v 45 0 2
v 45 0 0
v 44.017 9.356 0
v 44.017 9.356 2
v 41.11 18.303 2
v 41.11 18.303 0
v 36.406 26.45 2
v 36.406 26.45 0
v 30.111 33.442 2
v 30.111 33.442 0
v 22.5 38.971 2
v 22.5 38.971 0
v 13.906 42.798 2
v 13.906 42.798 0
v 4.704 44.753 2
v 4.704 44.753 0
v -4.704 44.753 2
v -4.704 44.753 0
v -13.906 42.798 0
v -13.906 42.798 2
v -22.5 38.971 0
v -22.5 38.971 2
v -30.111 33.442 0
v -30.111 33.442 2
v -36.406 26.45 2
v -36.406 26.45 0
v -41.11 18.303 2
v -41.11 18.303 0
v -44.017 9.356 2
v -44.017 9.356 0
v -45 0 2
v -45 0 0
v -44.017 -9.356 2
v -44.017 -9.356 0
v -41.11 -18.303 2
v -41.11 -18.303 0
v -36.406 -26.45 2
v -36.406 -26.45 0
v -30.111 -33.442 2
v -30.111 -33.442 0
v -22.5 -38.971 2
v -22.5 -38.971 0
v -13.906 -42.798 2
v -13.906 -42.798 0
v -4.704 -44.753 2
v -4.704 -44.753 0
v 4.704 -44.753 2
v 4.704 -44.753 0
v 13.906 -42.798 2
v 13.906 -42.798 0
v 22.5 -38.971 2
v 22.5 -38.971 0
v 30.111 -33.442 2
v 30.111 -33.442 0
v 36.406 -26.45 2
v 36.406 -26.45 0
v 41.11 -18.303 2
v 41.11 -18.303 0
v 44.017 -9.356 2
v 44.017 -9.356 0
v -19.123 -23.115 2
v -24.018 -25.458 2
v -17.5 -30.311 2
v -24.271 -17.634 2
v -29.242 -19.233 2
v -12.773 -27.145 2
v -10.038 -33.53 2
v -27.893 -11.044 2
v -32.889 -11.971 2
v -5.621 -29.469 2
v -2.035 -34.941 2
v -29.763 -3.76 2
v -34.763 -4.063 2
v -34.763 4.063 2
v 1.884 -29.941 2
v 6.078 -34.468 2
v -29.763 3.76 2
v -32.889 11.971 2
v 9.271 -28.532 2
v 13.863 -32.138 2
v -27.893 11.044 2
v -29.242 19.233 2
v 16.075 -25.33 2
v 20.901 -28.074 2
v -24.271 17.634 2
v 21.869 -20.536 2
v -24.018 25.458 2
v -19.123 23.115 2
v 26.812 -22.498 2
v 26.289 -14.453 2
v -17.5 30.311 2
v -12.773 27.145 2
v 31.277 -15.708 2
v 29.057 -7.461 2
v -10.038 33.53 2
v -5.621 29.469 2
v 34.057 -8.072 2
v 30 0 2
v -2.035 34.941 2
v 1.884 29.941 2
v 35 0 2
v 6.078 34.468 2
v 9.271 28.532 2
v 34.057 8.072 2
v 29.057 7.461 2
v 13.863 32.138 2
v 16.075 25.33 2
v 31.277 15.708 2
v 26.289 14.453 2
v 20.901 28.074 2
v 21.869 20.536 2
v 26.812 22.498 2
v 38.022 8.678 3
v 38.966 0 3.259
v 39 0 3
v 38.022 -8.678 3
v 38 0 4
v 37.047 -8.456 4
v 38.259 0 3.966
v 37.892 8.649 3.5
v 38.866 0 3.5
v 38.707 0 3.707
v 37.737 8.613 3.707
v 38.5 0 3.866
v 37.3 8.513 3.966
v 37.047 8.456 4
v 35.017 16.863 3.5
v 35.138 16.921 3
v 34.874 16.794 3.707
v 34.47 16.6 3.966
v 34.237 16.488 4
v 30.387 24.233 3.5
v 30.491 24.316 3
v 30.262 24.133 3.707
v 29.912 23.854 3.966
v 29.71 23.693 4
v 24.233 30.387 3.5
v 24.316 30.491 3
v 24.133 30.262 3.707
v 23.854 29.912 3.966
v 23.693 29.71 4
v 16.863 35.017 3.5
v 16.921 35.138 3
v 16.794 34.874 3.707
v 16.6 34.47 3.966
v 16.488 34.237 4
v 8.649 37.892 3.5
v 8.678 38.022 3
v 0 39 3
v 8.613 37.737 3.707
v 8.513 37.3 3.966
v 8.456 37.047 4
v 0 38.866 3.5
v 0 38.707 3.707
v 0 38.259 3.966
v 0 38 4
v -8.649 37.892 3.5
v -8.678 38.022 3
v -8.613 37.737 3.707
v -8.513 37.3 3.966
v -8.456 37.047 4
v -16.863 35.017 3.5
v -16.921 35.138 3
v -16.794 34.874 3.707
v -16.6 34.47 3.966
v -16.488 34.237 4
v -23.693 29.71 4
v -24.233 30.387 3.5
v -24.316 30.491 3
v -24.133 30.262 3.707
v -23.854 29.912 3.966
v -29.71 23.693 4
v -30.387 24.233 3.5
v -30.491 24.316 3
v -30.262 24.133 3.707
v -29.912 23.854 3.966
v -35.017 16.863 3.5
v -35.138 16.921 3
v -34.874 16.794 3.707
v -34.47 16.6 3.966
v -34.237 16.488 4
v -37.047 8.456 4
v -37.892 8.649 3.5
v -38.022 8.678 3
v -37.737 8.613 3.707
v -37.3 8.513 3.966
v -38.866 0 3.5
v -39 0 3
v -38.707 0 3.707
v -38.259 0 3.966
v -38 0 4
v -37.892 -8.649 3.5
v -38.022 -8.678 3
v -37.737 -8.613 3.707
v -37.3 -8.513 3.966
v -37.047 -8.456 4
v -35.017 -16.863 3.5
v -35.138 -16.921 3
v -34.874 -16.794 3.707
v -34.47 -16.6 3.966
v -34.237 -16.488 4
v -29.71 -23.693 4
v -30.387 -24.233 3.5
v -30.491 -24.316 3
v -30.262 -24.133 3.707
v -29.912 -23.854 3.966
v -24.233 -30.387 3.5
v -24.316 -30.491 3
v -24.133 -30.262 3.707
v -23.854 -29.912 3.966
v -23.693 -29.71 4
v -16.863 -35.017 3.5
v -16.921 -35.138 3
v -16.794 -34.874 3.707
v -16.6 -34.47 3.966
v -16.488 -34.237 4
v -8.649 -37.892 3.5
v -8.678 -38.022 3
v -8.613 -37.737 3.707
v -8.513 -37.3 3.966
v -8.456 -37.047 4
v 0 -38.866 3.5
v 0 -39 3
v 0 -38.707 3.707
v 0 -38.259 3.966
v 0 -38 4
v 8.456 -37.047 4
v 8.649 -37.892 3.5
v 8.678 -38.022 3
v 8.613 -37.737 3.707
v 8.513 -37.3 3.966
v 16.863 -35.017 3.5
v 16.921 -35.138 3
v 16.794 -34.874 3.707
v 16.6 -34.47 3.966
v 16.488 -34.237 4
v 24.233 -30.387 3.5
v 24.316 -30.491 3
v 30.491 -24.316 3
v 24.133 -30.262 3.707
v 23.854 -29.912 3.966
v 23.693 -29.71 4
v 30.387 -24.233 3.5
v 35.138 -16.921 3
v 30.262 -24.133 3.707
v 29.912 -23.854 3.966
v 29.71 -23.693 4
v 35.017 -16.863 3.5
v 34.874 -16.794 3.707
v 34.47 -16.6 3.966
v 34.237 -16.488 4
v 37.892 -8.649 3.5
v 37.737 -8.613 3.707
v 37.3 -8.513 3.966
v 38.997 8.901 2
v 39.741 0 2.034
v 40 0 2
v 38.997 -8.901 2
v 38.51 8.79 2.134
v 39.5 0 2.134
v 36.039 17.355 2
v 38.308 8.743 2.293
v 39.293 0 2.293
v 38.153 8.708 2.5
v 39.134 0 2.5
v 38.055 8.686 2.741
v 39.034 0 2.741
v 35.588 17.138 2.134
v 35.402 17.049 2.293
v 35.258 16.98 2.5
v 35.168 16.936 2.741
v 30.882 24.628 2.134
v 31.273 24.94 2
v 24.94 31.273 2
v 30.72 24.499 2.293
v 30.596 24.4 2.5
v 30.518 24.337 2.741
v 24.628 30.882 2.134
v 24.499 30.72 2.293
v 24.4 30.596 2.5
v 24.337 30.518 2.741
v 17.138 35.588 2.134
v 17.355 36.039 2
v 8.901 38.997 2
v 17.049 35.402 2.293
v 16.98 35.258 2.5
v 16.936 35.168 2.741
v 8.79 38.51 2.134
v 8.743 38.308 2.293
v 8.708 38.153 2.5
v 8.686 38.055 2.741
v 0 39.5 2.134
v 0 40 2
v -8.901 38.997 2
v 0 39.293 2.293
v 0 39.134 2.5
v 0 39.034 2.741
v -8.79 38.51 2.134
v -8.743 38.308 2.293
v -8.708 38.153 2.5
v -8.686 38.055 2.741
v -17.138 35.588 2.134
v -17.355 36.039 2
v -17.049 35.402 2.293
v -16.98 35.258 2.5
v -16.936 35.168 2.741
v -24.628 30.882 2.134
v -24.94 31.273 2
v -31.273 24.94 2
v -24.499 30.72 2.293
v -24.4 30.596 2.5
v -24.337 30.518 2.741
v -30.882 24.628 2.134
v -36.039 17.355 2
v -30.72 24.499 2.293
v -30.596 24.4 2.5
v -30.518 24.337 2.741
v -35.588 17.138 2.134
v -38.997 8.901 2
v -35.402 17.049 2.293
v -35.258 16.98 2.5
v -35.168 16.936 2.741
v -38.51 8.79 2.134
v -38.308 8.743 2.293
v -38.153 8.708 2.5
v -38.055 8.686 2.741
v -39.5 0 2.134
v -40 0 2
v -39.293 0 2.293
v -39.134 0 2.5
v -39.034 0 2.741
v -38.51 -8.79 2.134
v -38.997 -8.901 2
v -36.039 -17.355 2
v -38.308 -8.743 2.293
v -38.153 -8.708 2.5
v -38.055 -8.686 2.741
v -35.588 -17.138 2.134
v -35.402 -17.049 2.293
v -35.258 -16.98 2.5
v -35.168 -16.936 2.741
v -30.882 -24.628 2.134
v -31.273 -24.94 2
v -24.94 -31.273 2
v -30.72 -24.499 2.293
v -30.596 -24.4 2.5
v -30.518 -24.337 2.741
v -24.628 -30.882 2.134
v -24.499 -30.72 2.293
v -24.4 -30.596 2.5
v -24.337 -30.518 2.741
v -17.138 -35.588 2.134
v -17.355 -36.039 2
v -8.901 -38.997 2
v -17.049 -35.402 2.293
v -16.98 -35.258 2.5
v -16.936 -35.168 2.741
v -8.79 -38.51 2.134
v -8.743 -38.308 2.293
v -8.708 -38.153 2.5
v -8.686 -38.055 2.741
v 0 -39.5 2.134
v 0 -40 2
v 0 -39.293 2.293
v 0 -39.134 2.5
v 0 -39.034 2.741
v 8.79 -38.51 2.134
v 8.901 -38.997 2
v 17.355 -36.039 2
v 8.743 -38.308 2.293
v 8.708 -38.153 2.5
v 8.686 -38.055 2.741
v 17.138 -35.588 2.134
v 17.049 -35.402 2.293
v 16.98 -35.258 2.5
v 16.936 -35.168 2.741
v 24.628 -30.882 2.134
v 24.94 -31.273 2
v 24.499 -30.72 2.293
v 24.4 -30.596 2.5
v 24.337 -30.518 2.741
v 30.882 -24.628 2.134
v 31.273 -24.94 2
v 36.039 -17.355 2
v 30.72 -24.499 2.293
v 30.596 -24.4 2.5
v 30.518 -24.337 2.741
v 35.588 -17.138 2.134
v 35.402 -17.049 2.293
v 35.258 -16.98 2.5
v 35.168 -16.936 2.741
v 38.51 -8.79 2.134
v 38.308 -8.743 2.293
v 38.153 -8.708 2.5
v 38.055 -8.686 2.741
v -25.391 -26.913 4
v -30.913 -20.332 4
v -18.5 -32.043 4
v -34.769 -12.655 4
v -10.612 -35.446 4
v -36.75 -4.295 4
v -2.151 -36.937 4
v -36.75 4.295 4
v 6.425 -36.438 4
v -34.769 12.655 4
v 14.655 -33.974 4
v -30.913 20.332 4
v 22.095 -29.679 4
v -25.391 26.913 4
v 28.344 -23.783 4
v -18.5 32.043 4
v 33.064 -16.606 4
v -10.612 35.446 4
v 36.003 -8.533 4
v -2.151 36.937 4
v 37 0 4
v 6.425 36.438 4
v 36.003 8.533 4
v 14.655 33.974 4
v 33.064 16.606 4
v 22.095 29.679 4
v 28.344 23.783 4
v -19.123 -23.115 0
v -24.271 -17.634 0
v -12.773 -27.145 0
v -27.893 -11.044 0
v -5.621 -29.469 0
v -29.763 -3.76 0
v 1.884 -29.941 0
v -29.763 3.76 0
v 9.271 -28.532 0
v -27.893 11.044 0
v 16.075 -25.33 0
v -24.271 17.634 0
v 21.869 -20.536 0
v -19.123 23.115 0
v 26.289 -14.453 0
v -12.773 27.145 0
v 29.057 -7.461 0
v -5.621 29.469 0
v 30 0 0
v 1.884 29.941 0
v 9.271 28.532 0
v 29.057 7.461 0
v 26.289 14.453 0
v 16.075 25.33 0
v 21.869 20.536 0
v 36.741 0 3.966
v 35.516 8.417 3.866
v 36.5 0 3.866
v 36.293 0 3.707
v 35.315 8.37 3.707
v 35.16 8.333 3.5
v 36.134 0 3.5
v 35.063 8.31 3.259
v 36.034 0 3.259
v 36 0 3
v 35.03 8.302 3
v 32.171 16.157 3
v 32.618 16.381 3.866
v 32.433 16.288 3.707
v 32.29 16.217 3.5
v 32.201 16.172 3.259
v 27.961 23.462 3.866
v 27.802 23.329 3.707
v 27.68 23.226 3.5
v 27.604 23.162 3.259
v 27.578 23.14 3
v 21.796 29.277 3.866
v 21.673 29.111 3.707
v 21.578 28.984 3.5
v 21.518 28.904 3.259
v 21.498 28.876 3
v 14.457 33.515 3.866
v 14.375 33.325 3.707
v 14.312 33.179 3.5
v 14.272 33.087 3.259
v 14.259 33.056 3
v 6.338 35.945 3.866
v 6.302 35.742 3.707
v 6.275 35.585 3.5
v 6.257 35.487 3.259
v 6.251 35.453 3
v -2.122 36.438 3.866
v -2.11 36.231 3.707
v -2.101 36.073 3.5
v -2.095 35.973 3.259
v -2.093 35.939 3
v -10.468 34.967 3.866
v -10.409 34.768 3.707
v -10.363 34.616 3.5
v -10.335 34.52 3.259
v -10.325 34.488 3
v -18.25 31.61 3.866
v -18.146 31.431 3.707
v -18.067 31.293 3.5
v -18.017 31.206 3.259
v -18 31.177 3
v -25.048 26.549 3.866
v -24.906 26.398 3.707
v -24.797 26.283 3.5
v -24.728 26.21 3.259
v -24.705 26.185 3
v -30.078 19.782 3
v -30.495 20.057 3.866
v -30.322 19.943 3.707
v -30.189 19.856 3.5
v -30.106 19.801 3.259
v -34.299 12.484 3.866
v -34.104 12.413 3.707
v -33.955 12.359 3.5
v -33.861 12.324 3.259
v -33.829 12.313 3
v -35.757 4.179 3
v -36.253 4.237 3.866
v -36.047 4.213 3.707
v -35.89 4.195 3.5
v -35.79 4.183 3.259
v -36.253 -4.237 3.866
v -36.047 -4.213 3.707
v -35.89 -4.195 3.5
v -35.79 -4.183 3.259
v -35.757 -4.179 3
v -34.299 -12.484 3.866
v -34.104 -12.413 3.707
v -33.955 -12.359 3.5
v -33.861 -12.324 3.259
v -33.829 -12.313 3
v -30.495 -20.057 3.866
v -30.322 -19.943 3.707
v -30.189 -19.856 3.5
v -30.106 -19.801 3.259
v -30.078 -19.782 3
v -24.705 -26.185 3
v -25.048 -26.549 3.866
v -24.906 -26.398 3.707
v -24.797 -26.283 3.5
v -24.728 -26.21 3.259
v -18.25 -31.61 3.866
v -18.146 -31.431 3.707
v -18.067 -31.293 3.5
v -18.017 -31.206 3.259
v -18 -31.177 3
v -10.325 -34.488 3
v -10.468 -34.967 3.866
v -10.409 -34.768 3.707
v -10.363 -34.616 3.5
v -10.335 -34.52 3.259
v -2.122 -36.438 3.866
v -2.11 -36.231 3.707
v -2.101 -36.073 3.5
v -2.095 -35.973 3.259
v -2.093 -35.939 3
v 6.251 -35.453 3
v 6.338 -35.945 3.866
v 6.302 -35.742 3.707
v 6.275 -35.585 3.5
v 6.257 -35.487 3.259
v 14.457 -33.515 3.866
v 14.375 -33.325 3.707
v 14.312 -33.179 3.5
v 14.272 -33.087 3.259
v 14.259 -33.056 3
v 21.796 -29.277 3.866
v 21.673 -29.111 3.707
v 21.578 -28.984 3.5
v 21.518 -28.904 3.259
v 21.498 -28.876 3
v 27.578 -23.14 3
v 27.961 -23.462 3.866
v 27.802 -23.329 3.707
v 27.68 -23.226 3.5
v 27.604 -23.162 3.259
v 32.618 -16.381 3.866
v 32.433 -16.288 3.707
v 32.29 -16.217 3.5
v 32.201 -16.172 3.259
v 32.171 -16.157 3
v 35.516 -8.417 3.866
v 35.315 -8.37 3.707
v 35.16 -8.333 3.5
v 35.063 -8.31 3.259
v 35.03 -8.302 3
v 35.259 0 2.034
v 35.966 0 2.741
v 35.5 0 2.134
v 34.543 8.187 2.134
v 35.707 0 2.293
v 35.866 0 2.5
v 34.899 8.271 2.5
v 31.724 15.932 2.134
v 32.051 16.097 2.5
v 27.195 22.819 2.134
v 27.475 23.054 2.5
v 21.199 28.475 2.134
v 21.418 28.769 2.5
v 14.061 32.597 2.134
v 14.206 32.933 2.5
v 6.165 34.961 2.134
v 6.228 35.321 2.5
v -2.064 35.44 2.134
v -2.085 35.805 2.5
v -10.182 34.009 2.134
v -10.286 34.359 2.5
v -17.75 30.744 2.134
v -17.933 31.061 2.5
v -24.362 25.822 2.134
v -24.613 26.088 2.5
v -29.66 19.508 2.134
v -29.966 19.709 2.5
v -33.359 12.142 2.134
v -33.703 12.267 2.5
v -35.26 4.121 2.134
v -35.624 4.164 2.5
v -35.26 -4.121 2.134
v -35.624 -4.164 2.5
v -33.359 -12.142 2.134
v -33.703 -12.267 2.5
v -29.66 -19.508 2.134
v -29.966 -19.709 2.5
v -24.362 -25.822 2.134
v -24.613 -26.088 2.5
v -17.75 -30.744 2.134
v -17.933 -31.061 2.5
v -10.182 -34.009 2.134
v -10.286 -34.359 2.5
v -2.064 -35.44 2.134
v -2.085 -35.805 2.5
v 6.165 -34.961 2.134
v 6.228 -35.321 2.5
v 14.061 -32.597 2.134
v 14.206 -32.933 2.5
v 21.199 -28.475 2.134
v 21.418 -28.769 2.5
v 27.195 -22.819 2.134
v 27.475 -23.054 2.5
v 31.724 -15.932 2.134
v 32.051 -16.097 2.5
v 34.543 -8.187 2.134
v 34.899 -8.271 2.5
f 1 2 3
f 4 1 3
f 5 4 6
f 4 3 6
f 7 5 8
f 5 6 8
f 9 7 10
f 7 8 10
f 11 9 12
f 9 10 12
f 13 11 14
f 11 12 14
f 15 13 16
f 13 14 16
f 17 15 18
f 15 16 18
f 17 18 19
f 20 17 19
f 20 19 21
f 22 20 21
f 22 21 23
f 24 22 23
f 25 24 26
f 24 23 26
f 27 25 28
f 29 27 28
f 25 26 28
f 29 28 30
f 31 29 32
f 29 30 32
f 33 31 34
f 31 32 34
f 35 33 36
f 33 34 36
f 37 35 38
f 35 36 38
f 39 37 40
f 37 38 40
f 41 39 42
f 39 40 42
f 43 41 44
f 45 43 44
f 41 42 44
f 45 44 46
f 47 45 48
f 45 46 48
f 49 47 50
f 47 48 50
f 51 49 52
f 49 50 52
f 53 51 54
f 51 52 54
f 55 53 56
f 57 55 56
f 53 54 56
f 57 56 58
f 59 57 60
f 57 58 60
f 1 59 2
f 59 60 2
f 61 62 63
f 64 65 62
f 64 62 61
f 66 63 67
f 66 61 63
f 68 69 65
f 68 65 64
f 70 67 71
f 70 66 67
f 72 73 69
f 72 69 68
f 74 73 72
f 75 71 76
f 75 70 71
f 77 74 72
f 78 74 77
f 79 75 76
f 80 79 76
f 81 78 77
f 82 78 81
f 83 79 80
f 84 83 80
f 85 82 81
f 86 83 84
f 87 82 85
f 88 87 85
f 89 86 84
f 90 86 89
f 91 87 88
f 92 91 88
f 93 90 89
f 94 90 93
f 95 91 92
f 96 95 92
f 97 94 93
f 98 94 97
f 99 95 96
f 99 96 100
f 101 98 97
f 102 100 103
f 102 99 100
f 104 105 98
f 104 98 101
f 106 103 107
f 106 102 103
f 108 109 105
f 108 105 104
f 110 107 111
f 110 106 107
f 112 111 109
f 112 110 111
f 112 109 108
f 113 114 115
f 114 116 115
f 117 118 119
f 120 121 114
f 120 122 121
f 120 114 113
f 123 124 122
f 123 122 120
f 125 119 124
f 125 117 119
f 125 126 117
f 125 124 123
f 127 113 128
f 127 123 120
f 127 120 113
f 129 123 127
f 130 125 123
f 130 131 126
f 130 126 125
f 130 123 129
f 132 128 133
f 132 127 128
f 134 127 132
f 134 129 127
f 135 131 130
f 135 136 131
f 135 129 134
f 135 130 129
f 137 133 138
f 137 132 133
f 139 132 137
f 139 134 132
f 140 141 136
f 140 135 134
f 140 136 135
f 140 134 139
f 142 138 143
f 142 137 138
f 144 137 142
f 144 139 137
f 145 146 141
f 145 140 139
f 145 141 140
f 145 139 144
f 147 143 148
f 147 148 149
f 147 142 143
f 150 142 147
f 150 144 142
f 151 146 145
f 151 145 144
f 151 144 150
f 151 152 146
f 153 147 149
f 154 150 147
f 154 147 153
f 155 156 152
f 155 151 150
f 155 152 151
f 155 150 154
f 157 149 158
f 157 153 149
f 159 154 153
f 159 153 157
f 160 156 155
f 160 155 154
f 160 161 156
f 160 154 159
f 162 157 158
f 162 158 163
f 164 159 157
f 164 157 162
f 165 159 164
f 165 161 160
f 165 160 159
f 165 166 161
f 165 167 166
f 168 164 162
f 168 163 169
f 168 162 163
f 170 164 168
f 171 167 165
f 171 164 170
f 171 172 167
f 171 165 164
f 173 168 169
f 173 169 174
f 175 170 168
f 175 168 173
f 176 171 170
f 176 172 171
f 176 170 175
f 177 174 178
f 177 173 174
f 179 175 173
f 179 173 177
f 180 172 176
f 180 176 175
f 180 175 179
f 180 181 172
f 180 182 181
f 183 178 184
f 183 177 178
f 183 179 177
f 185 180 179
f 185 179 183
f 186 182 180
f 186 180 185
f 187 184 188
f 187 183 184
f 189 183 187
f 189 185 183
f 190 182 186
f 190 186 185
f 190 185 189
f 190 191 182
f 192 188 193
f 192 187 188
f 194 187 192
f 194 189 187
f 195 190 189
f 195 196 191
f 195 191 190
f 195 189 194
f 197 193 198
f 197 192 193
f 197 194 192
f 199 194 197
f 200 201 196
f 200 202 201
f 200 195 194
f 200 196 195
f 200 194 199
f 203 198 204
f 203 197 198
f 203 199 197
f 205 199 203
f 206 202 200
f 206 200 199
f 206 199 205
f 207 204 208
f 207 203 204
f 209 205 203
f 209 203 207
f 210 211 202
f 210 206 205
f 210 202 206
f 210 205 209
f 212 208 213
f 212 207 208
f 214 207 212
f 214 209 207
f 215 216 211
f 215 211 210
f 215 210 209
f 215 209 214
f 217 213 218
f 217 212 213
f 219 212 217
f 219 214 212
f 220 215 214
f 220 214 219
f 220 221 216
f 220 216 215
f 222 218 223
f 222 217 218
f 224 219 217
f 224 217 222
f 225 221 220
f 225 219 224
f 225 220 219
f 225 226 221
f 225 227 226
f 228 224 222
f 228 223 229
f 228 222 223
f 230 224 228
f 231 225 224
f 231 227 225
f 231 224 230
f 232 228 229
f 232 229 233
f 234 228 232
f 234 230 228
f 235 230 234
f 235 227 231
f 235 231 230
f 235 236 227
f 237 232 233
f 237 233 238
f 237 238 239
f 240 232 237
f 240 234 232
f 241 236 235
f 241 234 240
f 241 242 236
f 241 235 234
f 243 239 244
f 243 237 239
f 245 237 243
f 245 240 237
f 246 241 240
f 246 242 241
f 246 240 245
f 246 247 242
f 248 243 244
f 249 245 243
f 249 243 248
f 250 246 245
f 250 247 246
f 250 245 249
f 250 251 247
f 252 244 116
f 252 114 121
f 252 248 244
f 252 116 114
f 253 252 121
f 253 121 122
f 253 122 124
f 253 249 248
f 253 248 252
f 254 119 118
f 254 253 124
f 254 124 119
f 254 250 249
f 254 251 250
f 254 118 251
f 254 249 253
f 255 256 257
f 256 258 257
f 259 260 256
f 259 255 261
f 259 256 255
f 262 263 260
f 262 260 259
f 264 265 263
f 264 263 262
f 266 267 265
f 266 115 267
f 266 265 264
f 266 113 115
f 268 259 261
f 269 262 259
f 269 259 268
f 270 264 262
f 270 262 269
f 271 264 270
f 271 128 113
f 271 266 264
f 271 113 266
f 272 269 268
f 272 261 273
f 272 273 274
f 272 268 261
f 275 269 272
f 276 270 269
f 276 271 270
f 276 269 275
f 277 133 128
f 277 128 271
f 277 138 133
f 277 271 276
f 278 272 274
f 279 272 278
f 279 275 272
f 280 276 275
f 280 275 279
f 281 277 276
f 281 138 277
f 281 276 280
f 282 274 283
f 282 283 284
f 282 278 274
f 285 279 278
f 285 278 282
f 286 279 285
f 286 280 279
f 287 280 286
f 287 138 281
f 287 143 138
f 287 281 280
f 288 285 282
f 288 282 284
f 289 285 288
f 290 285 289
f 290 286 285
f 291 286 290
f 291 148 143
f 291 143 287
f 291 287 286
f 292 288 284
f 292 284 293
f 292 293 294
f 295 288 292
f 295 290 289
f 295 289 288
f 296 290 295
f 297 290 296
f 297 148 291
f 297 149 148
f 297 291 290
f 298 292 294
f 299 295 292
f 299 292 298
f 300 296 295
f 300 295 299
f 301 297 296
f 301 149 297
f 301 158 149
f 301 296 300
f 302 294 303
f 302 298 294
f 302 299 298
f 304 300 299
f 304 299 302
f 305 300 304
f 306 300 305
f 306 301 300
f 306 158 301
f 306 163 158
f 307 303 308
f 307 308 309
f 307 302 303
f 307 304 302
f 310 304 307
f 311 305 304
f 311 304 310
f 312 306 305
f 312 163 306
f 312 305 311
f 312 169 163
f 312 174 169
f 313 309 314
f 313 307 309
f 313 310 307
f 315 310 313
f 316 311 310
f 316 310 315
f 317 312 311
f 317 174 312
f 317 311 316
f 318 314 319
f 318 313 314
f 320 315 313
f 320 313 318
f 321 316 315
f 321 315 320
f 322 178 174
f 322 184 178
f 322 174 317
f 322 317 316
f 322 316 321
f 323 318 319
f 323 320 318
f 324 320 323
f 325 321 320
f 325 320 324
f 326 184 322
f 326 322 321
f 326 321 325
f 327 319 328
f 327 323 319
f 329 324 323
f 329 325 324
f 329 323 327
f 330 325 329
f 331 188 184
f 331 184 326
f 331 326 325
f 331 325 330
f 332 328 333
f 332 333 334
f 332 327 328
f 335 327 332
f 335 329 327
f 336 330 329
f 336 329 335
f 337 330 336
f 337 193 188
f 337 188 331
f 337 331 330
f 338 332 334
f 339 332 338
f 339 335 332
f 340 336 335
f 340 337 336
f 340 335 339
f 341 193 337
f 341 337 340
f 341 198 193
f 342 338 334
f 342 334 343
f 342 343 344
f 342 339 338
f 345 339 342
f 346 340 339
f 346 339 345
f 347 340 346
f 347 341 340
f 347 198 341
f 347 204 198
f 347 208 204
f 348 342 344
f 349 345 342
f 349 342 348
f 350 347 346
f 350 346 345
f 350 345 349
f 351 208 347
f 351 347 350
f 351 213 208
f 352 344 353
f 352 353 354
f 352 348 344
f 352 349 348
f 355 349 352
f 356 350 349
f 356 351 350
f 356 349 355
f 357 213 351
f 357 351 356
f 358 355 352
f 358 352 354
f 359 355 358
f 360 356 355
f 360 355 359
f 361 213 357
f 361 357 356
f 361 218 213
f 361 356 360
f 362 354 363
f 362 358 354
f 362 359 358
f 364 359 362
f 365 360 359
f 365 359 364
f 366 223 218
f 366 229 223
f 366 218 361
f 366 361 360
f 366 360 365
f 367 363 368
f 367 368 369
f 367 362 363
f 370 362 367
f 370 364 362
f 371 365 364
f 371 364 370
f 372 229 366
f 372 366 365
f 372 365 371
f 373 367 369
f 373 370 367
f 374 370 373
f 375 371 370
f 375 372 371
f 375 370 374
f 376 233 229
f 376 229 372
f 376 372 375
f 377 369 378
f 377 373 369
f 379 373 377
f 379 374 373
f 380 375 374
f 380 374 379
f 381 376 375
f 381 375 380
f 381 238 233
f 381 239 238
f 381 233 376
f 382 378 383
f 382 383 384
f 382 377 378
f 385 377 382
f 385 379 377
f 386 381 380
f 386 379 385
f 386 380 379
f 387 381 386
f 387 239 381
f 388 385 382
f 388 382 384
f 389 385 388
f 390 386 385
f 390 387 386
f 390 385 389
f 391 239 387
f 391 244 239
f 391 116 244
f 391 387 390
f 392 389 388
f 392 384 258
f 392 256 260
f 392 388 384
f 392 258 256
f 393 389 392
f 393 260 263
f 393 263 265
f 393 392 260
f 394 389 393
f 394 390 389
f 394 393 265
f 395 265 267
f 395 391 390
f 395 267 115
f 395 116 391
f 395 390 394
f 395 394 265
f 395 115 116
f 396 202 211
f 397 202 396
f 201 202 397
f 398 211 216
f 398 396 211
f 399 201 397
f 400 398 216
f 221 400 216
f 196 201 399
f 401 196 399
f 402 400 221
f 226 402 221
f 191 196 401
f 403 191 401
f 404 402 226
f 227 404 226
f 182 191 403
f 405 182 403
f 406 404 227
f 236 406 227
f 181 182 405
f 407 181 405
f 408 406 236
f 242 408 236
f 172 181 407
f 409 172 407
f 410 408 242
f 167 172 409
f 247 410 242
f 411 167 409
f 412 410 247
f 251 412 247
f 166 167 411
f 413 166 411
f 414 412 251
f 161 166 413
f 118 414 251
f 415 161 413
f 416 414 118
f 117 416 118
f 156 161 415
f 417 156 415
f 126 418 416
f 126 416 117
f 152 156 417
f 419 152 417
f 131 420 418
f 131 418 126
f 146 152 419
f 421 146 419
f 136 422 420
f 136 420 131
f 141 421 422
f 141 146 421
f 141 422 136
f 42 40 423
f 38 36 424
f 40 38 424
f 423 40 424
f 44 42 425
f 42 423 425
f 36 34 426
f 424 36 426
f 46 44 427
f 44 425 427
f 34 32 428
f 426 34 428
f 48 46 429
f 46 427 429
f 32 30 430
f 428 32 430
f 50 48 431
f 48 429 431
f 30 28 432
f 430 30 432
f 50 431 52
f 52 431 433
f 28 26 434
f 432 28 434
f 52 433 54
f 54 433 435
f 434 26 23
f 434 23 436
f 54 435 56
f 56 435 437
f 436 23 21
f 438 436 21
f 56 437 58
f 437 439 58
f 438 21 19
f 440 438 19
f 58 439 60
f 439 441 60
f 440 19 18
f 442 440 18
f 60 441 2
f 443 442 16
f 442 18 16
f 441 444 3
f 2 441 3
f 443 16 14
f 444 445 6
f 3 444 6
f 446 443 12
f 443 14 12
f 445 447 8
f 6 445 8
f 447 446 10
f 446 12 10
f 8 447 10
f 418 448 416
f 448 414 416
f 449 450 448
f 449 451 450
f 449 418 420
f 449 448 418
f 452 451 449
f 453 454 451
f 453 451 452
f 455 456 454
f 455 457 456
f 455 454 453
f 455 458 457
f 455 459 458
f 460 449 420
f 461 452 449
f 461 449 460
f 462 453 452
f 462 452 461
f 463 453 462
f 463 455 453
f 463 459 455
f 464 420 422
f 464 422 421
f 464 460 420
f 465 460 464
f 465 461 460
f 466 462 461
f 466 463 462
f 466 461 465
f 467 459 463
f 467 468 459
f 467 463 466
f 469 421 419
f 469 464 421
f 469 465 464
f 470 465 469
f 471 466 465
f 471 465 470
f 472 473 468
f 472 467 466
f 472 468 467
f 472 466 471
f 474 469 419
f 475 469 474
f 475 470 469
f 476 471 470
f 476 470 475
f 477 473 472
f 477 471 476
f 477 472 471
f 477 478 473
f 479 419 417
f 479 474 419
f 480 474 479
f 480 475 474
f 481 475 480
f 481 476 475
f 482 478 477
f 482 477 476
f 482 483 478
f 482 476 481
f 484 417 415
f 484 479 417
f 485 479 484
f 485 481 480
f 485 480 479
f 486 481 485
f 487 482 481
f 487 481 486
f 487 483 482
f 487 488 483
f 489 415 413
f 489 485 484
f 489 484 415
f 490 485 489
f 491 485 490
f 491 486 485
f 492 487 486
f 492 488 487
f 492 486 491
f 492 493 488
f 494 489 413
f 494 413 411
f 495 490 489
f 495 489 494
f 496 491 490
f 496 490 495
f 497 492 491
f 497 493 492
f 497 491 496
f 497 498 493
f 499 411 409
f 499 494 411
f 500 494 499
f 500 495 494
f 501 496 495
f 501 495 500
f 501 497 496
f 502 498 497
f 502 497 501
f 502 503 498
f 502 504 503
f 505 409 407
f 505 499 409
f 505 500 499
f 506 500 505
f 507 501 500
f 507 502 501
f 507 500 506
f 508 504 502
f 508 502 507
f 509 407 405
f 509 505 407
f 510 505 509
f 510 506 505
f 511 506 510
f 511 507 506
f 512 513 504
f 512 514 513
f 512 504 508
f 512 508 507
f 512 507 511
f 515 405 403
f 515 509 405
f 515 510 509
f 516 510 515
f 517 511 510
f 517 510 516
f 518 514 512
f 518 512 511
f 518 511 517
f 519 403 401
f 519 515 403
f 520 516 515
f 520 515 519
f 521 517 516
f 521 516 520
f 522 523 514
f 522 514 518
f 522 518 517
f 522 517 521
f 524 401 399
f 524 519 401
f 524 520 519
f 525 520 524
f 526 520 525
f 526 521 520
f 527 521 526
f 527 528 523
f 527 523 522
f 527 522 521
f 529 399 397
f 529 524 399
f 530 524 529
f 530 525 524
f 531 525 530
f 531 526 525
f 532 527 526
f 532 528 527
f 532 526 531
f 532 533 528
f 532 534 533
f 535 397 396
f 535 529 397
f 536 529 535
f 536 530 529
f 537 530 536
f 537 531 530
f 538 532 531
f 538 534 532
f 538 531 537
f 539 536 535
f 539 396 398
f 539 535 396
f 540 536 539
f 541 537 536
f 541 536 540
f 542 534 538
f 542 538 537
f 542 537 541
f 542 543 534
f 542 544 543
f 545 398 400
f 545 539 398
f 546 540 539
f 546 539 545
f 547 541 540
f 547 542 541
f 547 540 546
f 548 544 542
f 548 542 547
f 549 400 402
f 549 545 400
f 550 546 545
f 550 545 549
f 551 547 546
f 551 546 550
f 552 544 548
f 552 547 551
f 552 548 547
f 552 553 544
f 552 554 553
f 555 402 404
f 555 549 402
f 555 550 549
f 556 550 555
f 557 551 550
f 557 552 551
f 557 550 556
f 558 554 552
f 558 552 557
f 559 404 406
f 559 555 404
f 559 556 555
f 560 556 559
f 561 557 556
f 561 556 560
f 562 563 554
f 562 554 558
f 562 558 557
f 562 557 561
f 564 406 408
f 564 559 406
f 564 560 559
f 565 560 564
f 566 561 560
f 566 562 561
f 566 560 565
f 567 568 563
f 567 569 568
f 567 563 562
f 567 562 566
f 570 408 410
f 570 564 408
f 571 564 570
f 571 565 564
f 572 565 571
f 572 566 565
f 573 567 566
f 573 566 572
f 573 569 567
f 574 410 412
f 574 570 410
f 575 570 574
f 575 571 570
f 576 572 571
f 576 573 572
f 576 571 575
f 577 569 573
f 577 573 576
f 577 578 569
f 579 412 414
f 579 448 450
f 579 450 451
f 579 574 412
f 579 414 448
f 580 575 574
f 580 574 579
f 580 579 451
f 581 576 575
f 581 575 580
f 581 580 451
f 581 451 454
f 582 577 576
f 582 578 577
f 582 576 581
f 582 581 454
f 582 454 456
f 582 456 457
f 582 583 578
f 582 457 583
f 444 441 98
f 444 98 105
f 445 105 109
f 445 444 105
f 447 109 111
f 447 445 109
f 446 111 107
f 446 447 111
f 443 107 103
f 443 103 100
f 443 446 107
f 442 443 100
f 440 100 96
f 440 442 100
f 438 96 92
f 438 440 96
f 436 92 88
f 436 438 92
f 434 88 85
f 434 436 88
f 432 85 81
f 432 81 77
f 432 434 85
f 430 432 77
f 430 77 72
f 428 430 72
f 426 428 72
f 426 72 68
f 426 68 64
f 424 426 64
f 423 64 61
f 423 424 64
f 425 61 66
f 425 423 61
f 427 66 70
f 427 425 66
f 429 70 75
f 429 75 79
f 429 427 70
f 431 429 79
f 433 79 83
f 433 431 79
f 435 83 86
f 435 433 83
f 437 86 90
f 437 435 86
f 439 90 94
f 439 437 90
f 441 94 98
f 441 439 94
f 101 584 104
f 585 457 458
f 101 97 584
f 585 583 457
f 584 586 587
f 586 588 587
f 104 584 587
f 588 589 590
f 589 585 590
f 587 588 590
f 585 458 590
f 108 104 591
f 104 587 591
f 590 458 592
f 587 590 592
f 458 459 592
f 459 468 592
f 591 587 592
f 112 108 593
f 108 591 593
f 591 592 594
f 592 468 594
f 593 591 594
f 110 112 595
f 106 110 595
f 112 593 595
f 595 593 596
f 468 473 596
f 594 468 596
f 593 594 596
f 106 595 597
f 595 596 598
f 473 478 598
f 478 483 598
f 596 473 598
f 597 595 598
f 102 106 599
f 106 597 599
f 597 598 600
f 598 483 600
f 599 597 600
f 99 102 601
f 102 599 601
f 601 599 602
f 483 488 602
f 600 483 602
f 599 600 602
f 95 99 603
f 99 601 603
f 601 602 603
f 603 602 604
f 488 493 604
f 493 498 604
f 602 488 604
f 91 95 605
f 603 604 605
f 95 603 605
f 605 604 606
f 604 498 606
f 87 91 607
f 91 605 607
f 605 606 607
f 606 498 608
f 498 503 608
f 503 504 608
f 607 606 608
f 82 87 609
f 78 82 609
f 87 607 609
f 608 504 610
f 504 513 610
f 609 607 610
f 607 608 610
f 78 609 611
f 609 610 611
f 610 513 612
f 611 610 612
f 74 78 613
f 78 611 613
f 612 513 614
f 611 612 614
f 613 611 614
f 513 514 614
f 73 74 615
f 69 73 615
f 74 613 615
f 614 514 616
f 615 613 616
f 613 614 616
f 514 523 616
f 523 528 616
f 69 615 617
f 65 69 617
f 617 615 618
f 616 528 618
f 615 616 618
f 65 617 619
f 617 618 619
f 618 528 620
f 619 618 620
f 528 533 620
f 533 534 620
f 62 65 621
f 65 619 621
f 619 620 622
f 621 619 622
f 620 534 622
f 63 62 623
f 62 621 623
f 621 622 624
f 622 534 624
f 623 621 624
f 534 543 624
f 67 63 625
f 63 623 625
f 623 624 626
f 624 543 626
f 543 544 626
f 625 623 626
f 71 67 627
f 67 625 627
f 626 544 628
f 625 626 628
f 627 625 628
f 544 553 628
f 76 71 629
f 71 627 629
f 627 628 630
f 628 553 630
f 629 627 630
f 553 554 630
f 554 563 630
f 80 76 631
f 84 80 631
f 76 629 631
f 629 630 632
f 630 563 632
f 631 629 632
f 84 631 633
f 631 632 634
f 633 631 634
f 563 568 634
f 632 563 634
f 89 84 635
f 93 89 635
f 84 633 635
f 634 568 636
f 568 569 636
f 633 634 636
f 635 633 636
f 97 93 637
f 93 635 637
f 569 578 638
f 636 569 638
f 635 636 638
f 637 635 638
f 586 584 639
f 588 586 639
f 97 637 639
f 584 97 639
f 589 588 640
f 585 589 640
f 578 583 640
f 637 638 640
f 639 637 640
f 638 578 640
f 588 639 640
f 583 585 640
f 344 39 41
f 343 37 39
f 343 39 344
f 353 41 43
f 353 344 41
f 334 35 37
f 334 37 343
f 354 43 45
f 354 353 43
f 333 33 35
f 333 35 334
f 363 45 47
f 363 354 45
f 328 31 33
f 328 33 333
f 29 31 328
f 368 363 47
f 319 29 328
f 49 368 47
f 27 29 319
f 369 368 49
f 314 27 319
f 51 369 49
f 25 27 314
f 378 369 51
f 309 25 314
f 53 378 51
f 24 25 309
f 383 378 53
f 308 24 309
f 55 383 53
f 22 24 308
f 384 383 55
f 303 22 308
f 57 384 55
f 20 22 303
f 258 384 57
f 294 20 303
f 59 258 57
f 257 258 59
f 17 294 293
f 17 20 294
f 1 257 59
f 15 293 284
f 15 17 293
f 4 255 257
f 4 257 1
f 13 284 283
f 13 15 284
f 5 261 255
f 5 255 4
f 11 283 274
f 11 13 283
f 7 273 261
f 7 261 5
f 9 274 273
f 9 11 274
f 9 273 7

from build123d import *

# Parameters (mm, degrees)
F0_R     = 45
F0_R_2   = 30
F1_DEPTH = 2
F2_R     = 39
F2_R_2   = 36
F3_DEPTH = 2
F4_R     = 0.99999


# Not quite as in the source:
# - a fillet or chamfer is up to 0.001 mm smaller than in the source, because OpenCascade refuses the exact size


with BuildPart() as f1:
    # F0 (on Top) → F1 (new body)
    with BuildSketch(Plane.XY):
        Circle(F0_R)
        Circle(F0_R_2, mode=Mode.SUBTRACT)
    extrude(amount=F1_DEPTH)

    # F2 (on face) → F3 (join)
    with BuildSketch(Plane.XY.offset(2)):
        Circle(F2_R)
        Circle(F2_R_2, mode=Mode.SUBTRACT)
    extrude(amount=F3_DEPTH)

    # F4 (radius 1 in the source; OpenCascade refuses exactly that, so slightly less here)
    f4_edges = [f1.edges().sort_by_distance(p)[0] for p in [
        (-39, 0, 2),
        (-39, 0, 4),
        (-36, 0, 4),
        (-36, 0, 2),
    ]]
    fillet(f4_edges, radius=F4_R)


solid = f1.part
